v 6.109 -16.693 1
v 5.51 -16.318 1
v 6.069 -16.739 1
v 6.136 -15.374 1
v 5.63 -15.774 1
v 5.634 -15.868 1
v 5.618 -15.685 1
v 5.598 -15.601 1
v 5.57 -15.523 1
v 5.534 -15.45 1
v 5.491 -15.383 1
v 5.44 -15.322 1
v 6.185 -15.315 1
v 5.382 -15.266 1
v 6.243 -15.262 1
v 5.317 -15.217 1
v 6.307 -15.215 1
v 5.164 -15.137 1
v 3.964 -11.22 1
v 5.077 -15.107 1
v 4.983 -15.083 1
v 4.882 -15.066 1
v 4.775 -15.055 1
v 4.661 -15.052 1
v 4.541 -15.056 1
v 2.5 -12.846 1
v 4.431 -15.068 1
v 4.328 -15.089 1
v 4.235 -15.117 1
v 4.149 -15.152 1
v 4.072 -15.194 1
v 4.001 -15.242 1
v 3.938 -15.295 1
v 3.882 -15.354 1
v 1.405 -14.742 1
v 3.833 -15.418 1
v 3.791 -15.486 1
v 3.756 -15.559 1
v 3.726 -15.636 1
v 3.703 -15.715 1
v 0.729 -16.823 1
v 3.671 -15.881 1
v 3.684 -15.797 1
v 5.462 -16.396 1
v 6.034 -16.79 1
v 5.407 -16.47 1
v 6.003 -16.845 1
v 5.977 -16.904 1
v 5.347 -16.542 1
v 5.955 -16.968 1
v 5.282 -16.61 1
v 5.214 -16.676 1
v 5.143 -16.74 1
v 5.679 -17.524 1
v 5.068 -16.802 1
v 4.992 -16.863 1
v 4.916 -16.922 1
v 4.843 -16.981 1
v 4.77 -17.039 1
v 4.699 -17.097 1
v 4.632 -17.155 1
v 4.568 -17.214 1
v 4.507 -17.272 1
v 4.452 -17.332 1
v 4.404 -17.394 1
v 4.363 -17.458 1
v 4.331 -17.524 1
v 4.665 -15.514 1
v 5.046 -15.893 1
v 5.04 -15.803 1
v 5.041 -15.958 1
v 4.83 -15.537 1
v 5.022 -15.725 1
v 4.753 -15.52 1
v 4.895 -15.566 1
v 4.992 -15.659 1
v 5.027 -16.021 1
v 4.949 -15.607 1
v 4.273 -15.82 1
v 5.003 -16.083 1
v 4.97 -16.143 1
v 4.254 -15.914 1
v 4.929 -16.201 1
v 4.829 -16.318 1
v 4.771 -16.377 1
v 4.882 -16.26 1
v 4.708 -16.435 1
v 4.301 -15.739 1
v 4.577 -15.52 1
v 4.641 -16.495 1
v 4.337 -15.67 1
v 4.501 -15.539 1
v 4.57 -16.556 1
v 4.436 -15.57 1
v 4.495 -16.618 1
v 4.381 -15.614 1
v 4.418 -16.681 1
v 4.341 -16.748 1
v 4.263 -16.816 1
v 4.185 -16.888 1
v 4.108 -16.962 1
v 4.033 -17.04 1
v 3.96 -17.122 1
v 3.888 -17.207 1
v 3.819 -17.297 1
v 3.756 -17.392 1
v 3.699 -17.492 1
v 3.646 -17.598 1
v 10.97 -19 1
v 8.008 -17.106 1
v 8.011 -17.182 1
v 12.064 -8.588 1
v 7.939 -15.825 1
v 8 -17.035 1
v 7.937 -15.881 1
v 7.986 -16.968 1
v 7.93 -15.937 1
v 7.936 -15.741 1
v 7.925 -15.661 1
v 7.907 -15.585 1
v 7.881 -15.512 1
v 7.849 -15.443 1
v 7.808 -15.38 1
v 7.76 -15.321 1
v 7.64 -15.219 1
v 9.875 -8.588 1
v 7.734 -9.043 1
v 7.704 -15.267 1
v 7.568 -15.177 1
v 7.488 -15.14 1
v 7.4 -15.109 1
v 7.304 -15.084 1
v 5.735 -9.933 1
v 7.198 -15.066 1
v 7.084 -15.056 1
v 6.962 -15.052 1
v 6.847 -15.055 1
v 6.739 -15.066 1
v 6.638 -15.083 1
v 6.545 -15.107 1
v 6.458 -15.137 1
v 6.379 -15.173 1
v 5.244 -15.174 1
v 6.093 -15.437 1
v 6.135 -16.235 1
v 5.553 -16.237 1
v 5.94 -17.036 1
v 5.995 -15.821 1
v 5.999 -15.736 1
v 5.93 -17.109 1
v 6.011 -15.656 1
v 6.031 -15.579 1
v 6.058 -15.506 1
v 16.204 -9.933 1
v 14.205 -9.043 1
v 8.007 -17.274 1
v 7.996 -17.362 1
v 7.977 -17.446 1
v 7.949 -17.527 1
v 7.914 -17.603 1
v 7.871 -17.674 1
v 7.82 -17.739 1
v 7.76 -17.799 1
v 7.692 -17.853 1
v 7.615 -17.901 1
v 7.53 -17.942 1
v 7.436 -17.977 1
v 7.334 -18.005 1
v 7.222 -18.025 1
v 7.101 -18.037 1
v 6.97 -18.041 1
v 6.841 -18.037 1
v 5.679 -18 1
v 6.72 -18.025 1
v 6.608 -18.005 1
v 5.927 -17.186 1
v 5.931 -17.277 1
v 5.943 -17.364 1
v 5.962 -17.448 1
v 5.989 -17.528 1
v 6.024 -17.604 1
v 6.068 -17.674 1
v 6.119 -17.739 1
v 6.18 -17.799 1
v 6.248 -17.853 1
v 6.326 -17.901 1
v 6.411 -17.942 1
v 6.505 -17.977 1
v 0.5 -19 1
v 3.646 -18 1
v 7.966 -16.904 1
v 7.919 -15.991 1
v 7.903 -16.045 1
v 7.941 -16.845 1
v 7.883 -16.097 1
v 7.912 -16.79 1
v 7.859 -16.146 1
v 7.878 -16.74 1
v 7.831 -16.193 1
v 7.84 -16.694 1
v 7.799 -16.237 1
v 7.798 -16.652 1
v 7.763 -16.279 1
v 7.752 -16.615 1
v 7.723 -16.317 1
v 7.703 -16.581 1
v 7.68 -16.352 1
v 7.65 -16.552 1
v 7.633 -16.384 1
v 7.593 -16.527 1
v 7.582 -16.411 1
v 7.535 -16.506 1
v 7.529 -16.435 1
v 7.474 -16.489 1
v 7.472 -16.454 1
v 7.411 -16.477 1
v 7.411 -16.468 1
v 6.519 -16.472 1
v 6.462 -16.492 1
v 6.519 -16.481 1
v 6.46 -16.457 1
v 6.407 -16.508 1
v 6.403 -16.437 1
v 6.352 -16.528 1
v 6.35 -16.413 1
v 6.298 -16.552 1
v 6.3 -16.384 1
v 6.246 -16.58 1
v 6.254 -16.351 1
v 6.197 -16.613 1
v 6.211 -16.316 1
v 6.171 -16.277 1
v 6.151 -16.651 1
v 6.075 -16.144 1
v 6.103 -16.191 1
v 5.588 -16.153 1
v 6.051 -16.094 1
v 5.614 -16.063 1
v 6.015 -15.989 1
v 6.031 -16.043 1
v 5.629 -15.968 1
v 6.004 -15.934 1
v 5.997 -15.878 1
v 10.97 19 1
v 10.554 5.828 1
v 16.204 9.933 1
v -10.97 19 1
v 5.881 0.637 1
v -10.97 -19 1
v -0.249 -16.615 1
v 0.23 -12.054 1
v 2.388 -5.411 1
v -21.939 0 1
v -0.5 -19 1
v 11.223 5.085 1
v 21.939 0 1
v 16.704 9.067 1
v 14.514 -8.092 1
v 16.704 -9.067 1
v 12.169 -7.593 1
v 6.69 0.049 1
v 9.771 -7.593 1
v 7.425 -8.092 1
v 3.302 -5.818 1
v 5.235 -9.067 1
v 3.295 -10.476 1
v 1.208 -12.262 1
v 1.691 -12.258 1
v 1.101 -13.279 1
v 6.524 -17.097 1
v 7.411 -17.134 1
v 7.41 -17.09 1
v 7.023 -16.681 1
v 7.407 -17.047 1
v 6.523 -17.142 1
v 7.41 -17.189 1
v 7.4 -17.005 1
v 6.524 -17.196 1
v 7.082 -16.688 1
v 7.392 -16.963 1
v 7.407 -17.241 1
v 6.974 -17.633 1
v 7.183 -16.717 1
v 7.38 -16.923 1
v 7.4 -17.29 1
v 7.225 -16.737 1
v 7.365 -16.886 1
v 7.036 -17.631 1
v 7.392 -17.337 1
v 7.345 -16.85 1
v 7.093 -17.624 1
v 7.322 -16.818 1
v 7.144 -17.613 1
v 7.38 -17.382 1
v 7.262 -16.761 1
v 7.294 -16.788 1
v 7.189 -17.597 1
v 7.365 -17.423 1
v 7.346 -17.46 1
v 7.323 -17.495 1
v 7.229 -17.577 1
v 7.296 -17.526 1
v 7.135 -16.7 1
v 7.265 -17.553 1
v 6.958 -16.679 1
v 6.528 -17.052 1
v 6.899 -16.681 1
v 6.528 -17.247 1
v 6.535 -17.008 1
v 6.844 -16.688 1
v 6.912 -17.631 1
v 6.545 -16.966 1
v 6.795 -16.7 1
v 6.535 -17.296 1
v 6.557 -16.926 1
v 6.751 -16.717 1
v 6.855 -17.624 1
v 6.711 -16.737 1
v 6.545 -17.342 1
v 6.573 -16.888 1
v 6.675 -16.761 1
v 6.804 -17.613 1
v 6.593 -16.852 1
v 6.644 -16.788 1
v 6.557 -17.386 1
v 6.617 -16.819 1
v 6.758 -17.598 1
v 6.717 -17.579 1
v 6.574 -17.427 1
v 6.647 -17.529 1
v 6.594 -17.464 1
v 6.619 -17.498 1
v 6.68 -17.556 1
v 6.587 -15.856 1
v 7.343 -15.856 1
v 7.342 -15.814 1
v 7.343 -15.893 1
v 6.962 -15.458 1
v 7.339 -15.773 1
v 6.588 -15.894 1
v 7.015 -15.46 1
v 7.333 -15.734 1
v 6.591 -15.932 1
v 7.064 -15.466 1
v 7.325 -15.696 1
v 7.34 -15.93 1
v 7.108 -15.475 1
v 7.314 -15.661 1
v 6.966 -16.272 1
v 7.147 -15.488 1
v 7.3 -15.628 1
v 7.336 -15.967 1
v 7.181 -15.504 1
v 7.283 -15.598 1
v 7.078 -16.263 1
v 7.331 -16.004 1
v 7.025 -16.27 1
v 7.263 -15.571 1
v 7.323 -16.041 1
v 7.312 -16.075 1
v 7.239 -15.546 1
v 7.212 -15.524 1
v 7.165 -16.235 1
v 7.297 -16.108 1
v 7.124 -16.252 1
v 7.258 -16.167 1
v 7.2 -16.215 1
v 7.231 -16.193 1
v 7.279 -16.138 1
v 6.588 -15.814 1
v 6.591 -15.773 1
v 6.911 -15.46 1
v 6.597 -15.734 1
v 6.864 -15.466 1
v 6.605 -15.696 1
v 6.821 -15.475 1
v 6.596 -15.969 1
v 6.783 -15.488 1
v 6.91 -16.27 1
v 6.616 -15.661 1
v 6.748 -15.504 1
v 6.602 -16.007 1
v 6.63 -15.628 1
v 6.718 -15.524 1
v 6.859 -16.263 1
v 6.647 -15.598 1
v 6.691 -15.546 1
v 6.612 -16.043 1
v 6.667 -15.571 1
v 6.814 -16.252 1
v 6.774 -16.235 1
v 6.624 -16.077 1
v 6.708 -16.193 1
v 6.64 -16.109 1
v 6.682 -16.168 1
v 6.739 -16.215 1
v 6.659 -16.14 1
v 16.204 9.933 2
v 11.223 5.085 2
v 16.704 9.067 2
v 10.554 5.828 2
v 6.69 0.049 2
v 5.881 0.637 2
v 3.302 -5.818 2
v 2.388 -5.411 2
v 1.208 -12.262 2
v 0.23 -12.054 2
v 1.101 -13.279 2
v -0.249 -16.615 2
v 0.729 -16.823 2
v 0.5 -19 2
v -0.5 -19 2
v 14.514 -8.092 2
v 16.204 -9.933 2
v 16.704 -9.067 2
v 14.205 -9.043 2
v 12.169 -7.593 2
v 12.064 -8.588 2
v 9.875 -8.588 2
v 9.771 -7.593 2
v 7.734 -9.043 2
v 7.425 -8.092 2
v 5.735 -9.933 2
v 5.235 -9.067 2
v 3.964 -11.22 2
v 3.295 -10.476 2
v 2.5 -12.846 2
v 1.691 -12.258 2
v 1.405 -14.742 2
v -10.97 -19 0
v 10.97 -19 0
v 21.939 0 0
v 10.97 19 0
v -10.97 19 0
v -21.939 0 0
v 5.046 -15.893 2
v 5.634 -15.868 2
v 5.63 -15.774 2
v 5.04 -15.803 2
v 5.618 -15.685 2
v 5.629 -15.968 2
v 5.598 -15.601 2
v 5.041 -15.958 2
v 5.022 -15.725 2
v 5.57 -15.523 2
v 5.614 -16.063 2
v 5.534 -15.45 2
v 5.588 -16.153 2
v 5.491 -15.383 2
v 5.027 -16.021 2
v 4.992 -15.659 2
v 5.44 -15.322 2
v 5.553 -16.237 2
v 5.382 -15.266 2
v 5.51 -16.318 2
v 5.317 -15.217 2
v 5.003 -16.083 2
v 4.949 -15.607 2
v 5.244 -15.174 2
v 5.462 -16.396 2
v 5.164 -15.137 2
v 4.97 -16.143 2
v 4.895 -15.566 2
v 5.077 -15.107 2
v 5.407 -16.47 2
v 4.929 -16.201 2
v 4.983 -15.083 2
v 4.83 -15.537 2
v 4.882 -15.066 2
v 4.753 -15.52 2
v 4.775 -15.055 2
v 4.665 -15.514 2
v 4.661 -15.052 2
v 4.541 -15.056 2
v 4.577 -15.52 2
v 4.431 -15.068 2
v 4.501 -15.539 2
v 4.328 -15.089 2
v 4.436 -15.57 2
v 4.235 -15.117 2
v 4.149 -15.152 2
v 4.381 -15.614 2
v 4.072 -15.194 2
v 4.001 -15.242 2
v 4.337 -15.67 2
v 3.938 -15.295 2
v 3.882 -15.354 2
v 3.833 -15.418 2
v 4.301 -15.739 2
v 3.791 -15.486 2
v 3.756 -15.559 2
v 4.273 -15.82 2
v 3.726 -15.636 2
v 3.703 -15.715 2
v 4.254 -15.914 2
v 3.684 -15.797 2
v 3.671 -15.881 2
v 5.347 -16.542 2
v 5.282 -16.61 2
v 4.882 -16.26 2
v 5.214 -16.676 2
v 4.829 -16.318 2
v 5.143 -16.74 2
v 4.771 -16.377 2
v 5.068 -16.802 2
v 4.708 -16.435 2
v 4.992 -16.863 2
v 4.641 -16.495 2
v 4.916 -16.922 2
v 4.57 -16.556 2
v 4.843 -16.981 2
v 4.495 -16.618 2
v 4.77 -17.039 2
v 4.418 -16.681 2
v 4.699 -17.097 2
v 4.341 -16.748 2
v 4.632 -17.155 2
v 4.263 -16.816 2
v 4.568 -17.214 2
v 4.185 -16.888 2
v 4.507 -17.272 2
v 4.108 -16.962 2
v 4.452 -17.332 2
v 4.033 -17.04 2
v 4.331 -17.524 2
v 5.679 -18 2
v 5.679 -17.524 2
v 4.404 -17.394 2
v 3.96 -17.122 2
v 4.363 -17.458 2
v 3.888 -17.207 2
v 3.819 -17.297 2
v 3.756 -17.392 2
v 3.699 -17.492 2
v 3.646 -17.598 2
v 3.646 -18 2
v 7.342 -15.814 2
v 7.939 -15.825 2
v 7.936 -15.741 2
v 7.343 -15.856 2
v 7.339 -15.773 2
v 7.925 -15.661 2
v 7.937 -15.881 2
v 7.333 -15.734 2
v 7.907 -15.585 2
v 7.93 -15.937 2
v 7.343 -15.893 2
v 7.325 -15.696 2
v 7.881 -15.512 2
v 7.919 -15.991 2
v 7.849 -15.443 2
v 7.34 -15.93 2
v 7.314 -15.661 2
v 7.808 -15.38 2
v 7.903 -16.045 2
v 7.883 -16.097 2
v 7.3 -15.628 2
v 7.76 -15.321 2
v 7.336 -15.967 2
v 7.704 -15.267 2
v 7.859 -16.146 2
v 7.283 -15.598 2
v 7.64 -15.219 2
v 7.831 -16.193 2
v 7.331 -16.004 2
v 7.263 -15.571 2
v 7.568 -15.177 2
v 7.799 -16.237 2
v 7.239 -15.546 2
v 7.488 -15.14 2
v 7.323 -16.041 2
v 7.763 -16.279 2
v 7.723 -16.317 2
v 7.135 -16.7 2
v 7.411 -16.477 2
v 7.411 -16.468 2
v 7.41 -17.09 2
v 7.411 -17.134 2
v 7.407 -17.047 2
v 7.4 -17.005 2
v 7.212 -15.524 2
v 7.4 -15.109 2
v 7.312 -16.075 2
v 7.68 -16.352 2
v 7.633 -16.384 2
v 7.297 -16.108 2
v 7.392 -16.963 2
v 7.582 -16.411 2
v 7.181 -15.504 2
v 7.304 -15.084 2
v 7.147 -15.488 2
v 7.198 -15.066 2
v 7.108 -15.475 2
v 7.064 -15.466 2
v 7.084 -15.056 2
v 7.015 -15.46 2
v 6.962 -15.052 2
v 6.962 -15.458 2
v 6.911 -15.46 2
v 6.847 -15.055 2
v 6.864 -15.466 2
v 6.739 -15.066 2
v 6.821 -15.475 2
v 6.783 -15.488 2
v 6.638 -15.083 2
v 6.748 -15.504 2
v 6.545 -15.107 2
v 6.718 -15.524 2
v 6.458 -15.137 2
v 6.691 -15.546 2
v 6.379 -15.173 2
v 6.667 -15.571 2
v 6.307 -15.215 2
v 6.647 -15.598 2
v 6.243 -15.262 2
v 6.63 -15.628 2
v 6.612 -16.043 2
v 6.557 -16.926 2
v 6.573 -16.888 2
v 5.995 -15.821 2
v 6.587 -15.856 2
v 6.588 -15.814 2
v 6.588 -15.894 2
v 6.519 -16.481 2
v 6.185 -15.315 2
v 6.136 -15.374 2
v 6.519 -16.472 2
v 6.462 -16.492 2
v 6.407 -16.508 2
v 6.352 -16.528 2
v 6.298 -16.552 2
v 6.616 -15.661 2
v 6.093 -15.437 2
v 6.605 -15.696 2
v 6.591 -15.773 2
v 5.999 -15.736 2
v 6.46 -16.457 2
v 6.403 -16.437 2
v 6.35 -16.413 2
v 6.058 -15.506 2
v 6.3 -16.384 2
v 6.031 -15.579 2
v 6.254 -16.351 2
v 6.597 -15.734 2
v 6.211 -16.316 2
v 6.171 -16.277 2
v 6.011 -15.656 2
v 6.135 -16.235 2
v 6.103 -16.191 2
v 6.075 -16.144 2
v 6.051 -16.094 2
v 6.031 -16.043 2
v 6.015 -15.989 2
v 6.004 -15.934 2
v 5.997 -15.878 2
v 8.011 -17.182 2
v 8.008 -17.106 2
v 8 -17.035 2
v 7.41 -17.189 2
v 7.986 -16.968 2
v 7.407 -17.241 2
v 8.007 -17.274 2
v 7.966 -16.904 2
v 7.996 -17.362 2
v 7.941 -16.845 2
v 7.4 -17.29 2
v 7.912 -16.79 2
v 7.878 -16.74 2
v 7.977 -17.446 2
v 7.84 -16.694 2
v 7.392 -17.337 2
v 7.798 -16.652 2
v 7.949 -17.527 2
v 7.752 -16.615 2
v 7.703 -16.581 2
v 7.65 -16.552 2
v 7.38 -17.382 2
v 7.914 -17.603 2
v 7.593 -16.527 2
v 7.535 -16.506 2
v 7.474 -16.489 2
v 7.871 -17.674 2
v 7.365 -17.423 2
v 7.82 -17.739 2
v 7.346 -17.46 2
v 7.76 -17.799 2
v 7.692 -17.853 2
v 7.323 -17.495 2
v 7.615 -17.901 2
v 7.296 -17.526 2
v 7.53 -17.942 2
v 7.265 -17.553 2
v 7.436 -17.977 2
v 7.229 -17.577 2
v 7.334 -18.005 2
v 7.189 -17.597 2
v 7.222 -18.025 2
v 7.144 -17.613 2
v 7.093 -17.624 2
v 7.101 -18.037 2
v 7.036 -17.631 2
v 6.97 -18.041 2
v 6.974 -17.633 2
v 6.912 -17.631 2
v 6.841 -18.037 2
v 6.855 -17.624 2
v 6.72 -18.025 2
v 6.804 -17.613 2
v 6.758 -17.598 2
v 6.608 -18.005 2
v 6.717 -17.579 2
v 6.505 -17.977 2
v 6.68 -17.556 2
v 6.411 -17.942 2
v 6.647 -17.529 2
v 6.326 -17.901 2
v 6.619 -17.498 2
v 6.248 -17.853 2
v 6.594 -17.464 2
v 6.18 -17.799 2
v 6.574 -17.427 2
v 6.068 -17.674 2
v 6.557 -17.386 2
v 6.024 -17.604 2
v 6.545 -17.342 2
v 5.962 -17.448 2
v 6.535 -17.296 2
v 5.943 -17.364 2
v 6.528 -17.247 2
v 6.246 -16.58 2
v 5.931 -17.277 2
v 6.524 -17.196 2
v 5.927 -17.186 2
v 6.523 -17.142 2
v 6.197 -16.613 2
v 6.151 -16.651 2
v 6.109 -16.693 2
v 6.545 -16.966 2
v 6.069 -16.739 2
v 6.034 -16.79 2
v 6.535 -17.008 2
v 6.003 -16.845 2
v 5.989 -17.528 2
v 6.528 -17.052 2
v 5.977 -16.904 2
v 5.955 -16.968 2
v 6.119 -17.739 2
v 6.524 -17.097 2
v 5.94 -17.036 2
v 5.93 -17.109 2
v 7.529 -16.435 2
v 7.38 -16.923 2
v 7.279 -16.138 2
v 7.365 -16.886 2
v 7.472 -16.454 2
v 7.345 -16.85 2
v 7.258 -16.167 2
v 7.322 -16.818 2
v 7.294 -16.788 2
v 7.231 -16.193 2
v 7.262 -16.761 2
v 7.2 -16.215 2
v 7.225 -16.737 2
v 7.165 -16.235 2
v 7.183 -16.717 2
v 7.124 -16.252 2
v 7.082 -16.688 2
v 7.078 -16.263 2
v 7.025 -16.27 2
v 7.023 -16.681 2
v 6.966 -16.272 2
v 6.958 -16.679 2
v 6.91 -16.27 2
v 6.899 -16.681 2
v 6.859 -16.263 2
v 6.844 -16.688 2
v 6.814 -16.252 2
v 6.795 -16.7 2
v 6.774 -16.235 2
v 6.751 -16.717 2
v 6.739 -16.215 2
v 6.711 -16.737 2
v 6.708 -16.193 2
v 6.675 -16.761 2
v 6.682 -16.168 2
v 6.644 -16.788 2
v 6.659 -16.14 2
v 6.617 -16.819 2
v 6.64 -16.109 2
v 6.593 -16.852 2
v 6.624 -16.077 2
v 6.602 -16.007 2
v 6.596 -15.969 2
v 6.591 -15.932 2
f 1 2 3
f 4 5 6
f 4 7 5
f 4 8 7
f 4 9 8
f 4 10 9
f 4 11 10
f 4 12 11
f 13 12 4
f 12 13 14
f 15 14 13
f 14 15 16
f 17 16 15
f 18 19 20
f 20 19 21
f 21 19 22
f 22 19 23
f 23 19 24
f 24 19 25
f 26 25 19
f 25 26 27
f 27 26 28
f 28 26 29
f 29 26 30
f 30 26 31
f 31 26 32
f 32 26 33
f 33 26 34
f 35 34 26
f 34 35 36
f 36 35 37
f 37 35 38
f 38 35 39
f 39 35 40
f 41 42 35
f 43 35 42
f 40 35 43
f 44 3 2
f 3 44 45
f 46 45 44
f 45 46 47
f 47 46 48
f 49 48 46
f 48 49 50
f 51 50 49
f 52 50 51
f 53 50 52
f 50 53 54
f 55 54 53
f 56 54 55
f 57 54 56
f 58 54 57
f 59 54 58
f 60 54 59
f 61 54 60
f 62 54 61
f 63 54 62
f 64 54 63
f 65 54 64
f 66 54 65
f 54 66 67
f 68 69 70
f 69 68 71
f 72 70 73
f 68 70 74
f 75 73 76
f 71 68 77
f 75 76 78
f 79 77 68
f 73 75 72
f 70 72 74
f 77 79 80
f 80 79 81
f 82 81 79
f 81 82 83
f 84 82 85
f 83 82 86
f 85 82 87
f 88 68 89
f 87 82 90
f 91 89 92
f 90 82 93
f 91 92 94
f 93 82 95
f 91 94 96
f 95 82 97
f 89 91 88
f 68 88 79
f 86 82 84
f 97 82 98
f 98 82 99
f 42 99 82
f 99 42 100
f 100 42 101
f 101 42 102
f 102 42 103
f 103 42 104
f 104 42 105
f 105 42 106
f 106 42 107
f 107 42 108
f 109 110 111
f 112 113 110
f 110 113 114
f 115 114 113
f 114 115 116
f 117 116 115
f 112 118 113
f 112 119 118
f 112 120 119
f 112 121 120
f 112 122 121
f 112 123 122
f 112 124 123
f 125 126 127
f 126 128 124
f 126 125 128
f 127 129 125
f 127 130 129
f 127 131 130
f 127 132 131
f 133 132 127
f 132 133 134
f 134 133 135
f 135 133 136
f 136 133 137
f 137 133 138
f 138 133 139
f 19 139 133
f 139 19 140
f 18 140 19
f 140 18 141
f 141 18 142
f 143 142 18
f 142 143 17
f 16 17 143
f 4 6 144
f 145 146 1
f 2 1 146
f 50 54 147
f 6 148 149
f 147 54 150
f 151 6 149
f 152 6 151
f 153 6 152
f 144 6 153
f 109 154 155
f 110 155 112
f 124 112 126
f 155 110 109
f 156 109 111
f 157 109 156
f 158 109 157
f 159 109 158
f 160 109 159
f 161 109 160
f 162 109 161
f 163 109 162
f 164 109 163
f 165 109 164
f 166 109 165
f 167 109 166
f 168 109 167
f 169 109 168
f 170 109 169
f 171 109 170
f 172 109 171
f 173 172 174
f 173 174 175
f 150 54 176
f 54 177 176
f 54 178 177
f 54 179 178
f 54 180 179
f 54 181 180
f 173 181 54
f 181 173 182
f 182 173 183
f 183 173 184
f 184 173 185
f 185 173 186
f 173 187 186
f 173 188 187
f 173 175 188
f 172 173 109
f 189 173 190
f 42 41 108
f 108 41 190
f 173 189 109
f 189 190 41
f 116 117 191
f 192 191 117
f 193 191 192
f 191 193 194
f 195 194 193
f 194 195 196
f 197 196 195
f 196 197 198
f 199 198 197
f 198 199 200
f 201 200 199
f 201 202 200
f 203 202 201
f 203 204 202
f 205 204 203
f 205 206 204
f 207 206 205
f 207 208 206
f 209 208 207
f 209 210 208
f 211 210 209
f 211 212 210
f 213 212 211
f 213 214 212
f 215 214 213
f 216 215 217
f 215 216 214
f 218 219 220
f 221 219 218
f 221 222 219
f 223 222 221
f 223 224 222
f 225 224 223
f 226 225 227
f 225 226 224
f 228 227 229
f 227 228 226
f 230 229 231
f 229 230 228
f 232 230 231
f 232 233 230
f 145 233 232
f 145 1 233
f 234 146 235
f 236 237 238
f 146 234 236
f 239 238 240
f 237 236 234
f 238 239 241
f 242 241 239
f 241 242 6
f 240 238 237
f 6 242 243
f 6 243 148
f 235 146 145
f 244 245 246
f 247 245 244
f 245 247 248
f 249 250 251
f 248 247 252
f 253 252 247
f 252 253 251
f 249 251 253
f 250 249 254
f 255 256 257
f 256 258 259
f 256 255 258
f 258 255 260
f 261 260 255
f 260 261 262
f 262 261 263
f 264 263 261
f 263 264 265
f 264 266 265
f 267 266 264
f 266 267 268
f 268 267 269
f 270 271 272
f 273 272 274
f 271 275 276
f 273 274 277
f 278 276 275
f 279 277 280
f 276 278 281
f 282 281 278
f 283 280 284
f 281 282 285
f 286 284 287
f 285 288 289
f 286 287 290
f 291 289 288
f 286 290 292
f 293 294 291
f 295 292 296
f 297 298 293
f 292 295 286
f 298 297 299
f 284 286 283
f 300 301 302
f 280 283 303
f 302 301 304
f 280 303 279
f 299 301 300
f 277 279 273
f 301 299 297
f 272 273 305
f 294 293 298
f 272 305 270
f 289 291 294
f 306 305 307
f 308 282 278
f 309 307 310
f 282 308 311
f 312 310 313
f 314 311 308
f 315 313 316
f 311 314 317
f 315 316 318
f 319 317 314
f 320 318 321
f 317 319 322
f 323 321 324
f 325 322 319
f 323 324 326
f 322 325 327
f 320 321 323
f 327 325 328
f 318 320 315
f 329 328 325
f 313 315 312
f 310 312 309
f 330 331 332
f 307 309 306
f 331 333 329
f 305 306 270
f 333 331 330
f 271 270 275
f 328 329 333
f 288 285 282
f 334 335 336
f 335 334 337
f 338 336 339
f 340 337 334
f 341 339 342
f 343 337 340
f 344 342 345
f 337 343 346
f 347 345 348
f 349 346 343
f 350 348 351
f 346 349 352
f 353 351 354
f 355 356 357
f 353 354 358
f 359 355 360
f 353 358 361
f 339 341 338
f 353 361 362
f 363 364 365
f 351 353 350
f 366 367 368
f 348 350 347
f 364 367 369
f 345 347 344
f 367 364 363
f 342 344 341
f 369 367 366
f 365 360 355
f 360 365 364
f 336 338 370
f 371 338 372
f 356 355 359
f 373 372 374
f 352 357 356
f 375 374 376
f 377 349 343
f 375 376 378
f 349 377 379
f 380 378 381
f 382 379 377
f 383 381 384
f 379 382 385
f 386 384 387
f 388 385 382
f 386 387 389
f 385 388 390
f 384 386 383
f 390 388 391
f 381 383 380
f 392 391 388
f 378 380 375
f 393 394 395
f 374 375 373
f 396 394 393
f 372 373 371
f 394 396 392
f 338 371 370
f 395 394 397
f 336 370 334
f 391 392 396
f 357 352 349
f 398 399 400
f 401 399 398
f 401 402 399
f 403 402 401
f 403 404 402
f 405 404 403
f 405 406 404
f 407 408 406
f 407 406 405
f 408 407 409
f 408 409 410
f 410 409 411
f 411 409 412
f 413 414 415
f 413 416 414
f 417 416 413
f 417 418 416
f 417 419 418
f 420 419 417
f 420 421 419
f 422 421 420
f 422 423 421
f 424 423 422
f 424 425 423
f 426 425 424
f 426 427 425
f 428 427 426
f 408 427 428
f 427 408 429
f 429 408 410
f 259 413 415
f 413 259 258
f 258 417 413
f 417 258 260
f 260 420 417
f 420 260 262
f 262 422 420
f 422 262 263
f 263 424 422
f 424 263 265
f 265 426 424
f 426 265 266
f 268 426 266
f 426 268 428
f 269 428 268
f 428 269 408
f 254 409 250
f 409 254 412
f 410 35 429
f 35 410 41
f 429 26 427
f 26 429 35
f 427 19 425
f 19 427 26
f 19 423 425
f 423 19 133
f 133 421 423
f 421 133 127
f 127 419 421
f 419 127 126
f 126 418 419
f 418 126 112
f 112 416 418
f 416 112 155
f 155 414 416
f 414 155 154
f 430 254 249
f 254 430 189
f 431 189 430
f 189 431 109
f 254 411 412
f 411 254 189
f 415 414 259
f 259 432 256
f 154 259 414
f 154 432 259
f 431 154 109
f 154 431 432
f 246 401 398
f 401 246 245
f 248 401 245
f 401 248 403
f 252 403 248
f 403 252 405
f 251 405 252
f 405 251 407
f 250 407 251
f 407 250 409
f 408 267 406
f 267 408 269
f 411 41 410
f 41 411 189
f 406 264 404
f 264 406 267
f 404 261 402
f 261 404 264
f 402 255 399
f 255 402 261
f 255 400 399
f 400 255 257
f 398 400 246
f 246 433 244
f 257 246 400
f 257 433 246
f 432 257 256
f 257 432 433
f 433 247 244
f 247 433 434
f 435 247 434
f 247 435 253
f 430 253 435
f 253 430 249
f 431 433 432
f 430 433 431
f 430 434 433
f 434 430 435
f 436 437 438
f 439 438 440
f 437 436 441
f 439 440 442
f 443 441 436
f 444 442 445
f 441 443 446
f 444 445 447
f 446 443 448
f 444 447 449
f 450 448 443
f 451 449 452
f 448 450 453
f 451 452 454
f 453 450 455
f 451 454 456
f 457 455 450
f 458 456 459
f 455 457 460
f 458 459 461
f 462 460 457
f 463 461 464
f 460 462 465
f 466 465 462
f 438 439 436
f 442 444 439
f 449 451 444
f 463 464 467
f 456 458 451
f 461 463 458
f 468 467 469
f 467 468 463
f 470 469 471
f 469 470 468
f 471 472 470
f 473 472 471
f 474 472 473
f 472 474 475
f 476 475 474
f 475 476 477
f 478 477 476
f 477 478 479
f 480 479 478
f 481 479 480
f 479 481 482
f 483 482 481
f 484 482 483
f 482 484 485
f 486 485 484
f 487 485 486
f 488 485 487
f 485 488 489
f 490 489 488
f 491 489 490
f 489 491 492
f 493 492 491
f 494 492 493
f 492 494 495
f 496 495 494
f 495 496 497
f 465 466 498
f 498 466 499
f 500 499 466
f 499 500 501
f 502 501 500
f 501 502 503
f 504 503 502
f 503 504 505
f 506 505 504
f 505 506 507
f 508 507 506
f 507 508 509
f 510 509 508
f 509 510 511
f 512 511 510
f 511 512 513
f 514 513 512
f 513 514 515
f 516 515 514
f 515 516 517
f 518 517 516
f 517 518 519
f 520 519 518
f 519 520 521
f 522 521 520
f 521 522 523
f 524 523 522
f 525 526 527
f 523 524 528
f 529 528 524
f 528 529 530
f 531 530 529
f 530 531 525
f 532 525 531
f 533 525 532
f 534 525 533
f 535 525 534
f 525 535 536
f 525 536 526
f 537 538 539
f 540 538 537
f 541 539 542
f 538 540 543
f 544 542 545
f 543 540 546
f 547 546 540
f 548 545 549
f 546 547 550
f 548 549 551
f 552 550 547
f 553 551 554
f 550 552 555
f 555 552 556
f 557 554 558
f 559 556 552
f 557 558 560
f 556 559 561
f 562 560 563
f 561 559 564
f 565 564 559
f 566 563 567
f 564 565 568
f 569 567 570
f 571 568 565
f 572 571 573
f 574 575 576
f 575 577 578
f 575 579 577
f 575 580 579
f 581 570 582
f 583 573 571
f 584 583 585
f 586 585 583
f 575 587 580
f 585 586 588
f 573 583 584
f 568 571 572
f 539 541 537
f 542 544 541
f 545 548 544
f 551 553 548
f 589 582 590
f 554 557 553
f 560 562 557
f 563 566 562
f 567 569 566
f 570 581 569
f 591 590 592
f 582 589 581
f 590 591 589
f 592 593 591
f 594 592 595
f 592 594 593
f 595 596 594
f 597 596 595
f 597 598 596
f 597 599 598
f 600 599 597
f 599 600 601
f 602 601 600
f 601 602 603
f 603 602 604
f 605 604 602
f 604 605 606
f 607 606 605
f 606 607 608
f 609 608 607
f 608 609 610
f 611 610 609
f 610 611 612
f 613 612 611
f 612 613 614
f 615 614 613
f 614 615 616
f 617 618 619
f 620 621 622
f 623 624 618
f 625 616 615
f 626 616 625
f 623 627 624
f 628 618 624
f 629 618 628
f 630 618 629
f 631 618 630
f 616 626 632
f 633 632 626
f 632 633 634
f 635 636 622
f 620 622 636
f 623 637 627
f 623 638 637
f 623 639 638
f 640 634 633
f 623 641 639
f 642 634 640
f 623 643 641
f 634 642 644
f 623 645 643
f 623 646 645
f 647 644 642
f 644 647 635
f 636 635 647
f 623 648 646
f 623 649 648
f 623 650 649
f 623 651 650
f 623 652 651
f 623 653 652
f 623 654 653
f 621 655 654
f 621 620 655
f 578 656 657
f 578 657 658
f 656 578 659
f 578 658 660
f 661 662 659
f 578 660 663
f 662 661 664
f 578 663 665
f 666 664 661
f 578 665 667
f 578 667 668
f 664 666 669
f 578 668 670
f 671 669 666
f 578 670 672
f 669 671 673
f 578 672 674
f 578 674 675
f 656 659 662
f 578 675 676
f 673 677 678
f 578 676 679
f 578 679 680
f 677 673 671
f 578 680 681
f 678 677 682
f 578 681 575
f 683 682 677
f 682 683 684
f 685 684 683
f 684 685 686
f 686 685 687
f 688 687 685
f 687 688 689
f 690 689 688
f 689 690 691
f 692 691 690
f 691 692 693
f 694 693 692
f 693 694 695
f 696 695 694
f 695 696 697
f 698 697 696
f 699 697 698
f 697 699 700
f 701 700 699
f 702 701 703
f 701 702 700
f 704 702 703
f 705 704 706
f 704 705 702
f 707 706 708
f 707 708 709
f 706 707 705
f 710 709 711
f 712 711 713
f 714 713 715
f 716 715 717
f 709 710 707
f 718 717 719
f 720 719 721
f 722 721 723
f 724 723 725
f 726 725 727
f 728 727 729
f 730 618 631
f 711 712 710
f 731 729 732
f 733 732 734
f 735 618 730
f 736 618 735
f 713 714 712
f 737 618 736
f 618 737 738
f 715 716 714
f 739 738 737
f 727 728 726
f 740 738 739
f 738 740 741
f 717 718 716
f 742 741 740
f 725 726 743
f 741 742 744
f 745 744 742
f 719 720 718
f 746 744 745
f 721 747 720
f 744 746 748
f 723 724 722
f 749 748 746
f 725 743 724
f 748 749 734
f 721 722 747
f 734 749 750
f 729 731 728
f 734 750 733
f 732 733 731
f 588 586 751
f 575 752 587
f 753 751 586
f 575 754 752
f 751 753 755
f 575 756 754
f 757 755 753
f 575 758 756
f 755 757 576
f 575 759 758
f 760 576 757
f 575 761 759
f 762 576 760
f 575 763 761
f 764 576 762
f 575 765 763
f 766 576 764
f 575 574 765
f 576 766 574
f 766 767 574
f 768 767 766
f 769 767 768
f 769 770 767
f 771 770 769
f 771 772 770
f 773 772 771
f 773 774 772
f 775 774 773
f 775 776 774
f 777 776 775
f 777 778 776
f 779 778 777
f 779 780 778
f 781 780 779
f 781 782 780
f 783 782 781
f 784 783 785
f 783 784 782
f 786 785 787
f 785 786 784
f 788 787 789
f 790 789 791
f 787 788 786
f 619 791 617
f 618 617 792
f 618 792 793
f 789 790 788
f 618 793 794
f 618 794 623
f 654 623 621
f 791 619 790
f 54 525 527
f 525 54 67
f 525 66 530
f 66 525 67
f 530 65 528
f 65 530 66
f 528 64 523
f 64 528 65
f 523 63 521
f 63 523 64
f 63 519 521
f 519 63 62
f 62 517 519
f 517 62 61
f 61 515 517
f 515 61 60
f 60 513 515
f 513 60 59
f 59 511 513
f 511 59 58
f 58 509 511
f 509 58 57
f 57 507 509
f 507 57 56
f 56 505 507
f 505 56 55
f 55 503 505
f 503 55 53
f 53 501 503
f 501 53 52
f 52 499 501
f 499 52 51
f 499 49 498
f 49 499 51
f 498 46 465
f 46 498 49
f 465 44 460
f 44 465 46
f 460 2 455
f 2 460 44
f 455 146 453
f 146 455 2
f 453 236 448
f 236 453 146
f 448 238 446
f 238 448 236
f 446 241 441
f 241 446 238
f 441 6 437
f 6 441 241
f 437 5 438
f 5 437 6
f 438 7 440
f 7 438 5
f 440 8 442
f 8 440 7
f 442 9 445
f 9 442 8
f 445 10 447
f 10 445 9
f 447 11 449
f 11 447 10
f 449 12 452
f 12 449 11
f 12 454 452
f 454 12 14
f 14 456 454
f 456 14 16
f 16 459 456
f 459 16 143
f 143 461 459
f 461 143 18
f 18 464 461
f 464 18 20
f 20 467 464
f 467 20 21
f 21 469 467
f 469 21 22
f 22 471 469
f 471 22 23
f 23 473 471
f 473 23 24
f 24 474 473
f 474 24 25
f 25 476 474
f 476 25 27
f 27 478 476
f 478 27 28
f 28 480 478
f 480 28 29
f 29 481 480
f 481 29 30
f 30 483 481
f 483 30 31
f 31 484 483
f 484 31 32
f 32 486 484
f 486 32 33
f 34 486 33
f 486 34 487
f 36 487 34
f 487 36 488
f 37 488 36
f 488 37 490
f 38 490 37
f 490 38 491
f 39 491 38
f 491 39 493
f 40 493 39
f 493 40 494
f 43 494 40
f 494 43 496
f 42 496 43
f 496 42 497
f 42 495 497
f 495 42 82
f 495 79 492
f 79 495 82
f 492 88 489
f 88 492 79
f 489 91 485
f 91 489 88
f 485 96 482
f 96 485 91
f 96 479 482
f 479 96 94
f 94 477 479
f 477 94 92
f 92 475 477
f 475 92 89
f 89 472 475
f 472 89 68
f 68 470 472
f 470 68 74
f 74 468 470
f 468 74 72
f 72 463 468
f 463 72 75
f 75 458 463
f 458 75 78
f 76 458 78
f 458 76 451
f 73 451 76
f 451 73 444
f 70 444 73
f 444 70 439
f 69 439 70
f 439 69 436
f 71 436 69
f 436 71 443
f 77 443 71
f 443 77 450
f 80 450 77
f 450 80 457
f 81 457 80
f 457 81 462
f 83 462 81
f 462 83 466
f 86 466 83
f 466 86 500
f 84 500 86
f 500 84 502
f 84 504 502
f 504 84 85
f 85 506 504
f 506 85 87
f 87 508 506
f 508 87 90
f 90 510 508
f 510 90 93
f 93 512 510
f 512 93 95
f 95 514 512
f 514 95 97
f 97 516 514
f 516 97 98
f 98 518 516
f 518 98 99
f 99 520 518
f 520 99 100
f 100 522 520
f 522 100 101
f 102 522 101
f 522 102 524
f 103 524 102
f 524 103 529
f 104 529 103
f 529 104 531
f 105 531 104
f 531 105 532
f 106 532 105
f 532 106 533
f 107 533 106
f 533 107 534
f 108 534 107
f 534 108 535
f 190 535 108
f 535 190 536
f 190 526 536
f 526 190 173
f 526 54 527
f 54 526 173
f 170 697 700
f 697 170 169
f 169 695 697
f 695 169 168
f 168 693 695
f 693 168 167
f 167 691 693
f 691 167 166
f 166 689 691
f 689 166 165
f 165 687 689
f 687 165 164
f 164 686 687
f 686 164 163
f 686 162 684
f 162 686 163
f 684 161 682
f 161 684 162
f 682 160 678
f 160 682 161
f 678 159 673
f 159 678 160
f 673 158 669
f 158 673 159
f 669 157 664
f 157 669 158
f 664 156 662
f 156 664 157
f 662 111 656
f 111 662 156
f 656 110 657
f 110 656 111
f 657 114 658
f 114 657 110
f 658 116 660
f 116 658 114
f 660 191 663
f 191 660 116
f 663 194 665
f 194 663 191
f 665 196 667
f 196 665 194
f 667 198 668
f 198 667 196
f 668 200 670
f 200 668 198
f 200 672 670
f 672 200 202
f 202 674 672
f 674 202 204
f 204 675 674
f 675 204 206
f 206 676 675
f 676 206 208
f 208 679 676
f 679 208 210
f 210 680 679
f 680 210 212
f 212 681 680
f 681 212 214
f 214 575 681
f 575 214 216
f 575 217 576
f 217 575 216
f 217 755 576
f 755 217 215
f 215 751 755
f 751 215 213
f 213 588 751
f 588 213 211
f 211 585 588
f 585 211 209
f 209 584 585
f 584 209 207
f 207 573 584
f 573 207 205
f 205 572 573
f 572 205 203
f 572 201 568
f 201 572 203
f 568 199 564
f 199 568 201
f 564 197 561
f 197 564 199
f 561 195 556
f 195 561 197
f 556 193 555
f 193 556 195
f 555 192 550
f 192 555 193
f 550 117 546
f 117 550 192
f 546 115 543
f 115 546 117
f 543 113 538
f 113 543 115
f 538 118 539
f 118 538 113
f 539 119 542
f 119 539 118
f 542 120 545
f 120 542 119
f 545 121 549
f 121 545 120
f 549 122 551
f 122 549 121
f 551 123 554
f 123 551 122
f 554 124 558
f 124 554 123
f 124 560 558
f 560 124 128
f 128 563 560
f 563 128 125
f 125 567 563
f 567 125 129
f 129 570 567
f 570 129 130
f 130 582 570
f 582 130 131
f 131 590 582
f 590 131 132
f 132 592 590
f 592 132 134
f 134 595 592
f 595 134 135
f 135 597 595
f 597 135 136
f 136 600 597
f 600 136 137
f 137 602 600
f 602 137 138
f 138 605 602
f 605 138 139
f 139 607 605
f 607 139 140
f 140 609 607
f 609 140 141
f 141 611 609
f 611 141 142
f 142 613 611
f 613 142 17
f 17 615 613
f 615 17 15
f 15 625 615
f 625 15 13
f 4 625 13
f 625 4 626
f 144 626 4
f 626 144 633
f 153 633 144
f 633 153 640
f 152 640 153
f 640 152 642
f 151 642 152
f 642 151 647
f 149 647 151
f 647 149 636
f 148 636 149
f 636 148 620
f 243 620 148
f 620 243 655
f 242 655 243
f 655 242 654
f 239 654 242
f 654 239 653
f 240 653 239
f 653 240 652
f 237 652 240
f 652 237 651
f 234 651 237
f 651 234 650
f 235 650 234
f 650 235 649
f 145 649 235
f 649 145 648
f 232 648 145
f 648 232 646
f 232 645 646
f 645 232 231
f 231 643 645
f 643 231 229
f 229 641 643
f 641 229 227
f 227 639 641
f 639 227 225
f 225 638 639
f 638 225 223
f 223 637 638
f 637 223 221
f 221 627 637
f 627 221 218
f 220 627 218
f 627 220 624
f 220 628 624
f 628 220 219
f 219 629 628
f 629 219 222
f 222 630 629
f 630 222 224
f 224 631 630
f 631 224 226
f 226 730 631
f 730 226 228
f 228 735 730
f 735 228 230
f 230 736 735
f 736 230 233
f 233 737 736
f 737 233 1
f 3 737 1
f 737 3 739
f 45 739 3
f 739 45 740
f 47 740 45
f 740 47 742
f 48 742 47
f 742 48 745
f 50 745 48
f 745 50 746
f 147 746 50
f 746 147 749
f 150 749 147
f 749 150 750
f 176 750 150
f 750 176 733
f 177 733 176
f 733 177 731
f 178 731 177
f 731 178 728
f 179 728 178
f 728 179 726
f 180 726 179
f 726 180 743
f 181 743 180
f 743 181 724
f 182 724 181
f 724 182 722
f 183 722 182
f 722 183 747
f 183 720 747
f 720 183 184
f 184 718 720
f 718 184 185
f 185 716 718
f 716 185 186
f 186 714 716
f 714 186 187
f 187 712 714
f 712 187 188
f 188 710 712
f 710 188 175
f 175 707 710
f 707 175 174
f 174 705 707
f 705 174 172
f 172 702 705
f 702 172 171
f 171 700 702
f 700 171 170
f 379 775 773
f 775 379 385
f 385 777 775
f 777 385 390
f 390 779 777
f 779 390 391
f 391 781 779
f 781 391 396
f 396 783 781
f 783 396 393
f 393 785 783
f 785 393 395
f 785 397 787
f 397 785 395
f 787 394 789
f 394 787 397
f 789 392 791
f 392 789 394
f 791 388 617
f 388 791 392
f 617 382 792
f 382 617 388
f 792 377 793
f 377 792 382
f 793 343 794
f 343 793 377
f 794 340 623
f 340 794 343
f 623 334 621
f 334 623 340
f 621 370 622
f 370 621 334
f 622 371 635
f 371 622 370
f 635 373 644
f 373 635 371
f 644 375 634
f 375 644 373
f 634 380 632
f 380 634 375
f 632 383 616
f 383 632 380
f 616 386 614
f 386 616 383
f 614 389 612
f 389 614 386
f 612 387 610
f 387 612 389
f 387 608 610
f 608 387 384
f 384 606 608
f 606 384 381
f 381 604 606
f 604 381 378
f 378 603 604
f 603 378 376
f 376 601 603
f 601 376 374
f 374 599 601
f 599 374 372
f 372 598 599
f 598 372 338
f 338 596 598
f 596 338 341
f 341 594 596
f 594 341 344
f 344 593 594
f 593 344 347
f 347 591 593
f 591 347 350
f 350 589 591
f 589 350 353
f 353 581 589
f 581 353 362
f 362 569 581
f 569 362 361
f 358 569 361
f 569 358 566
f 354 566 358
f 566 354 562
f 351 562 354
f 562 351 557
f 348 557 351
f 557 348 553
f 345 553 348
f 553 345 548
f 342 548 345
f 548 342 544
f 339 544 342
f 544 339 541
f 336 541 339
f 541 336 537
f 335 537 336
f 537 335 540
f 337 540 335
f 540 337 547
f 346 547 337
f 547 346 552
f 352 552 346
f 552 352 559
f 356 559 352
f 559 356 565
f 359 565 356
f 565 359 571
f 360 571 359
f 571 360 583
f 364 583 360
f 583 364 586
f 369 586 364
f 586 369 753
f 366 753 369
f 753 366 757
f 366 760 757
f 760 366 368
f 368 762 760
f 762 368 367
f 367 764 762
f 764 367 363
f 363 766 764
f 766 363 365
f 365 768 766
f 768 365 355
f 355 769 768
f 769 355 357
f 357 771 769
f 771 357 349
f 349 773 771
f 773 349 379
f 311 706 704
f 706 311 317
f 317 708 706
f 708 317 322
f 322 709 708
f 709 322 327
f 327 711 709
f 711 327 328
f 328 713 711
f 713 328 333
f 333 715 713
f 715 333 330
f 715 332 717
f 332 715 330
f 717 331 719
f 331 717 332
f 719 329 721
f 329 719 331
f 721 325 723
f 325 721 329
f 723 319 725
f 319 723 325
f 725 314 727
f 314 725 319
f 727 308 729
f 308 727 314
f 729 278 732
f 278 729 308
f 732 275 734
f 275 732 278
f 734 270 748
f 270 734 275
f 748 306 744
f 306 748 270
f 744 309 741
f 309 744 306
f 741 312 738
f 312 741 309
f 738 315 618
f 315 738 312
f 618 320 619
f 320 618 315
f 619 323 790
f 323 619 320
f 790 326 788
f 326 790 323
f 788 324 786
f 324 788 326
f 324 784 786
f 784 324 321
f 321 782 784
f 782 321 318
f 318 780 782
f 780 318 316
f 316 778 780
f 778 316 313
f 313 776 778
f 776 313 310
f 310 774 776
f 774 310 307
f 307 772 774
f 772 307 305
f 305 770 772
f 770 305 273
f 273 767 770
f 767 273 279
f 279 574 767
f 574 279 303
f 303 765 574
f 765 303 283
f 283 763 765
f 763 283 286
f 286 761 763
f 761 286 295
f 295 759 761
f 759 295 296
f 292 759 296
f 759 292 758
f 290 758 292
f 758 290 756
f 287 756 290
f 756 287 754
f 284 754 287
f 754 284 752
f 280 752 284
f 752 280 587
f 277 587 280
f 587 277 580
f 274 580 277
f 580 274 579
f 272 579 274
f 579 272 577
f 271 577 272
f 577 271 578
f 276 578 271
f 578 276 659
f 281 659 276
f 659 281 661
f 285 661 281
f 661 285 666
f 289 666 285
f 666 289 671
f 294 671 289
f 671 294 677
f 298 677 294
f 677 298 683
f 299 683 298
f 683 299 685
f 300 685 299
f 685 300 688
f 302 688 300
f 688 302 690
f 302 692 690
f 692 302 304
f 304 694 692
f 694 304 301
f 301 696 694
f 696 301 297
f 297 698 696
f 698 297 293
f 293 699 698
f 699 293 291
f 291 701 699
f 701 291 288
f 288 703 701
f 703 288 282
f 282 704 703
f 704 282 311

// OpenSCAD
include <../Scripts/18xx tiles basic functions.scad>
hex("Green");
put_tilenr("28");
sharp_curve();
light_curve();
